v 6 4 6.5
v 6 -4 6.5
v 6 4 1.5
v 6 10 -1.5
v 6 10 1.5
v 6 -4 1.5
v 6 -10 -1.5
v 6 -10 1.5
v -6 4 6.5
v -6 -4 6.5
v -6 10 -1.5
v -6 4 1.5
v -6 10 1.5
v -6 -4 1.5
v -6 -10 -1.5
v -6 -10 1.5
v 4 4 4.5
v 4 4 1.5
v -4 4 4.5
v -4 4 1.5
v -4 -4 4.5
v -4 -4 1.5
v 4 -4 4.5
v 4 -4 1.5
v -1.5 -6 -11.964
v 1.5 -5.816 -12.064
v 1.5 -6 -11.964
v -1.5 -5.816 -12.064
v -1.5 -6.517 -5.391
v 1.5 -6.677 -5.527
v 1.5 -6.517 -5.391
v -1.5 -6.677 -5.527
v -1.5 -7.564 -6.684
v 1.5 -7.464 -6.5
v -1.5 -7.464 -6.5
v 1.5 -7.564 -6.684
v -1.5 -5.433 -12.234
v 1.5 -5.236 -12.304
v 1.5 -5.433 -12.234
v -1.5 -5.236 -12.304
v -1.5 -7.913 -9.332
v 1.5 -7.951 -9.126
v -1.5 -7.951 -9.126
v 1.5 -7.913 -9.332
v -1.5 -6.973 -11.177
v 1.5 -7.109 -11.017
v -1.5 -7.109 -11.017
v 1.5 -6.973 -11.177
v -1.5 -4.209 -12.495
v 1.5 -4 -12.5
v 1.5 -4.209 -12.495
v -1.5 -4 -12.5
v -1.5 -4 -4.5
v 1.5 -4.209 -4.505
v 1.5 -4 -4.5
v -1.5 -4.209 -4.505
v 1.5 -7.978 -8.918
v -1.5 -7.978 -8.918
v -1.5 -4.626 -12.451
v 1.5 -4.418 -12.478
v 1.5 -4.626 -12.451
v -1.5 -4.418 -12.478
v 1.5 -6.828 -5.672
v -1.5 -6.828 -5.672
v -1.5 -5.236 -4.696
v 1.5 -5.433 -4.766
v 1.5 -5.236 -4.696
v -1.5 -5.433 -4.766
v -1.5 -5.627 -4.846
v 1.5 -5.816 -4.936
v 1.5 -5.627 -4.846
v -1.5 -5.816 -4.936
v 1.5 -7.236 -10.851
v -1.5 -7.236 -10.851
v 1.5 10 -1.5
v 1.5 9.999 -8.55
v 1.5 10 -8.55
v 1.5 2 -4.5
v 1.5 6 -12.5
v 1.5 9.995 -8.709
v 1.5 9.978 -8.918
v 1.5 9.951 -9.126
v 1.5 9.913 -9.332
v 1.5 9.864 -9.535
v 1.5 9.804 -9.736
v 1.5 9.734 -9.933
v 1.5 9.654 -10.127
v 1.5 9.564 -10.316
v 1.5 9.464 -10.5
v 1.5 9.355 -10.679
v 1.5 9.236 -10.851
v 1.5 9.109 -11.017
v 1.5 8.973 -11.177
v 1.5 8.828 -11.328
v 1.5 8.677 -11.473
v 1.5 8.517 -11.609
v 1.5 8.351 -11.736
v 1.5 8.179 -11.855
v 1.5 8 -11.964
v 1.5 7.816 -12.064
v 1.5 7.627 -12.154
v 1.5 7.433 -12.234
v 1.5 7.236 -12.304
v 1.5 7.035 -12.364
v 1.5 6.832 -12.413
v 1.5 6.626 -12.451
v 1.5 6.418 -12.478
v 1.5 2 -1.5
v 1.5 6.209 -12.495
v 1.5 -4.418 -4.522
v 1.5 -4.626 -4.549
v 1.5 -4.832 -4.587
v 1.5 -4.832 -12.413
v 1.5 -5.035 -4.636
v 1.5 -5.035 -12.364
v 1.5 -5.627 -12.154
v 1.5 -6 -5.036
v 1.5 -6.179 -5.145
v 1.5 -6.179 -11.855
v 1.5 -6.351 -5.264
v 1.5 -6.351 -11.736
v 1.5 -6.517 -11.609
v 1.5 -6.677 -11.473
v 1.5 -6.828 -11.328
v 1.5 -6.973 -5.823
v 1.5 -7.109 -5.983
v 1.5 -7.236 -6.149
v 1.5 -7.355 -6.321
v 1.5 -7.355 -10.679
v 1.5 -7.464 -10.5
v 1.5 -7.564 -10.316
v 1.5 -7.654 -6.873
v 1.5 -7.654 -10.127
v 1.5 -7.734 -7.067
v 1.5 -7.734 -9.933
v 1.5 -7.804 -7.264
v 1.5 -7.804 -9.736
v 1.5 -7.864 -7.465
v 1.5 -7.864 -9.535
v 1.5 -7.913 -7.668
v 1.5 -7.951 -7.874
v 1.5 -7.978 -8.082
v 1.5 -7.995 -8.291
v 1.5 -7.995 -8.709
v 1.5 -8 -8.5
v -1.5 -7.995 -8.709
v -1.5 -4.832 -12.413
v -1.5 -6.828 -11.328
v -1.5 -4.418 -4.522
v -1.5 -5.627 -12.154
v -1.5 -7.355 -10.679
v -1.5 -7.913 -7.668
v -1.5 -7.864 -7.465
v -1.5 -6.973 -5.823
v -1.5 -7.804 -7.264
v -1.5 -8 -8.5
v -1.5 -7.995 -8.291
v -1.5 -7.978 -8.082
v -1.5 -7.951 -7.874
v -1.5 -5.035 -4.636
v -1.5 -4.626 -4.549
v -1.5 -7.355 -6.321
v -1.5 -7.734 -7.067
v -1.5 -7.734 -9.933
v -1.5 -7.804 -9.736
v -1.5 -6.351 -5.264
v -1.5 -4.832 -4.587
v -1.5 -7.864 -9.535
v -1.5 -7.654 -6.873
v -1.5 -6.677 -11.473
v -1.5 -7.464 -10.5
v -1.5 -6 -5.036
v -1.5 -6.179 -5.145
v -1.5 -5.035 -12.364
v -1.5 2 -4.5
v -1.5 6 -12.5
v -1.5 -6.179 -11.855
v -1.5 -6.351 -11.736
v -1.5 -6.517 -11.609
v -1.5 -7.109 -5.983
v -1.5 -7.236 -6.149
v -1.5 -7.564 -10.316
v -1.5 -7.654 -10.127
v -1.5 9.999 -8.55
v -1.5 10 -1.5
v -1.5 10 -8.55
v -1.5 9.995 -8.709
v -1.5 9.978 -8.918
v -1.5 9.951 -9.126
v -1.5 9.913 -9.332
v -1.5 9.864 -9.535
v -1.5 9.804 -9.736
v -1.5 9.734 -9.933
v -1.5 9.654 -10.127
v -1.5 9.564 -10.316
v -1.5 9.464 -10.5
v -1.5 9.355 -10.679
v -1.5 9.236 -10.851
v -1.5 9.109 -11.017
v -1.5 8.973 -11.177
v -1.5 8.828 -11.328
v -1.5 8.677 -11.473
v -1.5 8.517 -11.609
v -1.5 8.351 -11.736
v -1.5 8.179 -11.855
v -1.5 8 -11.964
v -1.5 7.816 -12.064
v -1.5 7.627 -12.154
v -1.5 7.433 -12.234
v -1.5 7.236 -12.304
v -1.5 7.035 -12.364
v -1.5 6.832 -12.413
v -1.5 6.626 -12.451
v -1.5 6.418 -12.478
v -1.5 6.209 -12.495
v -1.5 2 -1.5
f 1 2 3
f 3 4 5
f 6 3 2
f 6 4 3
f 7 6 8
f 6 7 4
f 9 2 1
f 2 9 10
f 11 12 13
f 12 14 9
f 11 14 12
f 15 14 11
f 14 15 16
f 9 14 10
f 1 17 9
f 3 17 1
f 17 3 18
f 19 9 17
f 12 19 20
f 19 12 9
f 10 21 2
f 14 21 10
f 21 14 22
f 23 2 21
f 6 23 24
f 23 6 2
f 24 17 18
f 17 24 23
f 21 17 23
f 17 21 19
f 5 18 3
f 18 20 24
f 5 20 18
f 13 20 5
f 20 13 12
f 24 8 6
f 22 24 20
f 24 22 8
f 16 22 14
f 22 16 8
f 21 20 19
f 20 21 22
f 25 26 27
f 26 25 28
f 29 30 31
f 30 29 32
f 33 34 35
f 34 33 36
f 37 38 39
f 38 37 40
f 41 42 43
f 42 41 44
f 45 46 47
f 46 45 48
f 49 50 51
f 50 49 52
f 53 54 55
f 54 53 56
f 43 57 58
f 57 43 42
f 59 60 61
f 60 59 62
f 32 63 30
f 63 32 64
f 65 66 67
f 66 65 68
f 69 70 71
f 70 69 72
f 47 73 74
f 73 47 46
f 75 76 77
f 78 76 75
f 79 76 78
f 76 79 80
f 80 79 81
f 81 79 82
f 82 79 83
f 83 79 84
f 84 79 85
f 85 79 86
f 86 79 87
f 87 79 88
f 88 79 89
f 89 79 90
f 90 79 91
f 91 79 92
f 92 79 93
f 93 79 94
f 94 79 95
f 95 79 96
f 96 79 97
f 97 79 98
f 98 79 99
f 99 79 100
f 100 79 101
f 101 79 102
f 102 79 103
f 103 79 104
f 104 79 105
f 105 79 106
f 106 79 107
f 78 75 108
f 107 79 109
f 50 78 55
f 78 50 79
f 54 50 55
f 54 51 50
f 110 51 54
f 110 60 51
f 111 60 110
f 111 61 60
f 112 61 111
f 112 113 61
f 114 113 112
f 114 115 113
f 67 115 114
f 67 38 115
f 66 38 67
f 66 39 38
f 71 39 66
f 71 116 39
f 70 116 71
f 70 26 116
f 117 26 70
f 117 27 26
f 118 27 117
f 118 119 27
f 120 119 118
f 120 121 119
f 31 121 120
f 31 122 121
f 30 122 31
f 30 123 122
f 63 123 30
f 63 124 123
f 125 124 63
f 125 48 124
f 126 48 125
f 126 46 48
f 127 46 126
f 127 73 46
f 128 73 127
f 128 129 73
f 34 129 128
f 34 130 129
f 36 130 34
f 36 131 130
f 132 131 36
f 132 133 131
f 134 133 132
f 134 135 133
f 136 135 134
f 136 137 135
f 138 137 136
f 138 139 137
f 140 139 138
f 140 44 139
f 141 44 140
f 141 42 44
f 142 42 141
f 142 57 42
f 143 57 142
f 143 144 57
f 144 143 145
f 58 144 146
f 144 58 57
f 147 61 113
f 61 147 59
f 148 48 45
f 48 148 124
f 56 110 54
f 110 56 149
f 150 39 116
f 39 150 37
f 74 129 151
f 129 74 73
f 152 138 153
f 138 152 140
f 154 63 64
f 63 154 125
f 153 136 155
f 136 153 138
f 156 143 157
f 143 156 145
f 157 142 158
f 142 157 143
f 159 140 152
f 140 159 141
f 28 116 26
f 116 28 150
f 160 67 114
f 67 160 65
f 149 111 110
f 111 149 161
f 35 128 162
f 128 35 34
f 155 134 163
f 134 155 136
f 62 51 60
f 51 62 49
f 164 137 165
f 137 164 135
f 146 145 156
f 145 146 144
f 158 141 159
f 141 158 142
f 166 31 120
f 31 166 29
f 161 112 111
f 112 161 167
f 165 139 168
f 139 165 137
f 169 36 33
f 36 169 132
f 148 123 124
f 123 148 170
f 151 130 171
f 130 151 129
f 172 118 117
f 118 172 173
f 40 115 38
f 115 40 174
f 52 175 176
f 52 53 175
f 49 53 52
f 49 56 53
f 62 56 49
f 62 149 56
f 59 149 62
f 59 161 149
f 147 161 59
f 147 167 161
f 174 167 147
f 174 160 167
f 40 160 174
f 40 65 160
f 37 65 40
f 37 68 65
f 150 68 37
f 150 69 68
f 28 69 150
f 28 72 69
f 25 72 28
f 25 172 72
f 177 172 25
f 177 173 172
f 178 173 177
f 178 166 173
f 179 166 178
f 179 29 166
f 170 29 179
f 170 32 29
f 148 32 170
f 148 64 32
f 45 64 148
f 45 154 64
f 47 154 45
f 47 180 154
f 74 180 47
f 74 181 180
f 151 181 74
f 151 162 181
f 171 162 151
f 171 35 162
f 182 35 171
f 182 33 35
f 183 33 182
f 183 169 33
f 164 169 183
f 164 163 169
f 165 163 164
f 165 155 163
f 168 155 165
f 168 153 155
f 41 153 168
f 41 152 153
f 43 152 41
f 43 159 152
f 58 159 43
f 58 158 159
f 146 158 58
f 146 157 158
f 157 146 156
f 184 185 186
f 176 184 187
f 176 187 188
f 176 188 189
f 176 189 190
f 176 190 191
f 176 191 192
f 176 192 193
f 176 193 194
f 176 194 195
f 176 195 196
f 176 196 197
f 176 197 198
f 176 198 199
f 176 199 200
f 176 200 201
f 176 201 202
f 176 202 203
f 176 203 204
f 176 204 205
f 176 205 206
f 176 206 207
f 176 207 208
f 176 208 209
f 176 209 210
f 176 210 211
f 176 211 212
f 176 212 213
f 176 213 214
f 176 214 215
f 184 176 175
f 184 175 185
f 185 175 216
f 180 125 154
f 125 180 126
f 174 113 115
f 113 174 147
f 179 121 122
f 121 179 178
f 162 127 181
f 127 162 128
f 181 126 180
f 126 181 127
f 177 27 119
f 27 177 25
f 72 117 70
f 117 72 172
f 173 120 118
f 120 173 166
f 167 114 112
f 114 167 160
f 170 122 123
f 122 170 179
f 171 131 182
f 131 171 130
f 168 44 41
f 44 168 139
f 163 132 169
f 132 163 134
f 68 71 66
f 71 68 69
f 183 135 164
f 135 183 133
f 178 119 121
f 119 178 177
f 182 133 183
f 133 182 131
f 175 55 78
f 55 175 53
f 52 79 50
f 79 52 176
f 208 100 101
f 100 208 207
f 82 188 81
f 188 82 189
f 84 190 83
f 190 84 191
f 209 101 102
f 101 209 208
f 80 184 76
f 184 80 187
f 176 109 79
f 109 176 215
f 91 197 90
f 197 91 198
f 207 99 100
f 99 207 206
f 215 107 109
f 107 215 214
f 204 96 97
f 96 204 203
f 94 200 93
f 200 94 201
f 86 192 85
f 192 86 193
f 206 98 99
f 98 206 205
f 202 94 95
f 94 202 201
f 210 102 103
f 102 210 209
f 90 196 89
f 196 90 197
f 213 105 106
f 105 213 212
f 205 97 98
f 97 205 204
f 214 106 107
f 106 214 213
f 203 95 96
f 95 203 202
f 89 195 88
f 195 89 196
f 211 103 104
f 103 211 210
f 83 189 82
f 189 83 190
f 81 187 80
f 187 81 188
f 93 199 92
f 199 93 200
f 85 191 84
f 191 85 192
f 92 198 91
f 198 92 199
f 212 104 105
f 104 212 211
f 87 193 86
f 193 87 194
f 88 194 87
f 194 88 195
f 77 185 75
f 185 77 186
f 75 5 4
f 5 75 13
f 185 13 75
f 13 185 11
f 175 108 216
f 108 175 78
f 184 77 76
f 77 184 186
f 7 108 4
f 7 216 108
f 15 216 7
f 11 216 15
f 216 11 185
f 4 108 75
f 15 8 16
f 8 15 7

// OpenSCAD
$fn=120;

hook_thickness = 3;
hook_inner_height = 10;
hook_max_depth = 8;

cable_binder_width = 8;
cable_binder_height = 3;
cable_binder_wall = 2;
cable_binder_x = cable_binder_width + 2 * cable_binder_wall;
cable_binder_y = hook_max_depth;
cable_binder_z = cable_binder_height + cable_binder_wall * 2;

_JOIN = 0.1;

module hook() {
    hook_radius = hook_max_depth / 2;
    cylinder(hook_thickness, hook_radius, hook_radius, center=true);
    translate([hook_inner_height / 2, 0, 0]) cube([hook_inner_height, hook_max_depth, hook_thickness], center=true);
    translate([hook_inner_height, 0, 0]) cylinder(hook_thickness, hook_radius, hook_radius, center=true);
    y = hook_max_depth / 2 + hook_thickness;
    translate([hook_inner_height, y / 2, 0]) cube([hook_max_depth, y + _JOIN, hook_thickness], center=true);
}



module cable_binder_tunnel() {

    difference() {
        cube([cable_binder_x, cable_binder_y, cable_binder_z], center=true);
        cube([cable_binder_width, cable_binder_y + 2, cable_binder_height], center=true);
    }
}

module all() {
    cube([cable_binder_x, hook_max_depth * 2.5, hook_thickness], center=true);

    dy_cable = 0;//hook_max_depth * 1.25 - cable_binder_y / 2;
    dz_cable = (cable_binder_z + hook_thickness) / 2 - cable_binder_wall;
    translate([0, -dy_cable, dz_cable]) cable_binder_tunnel();

    dx_hook = hook_inner_height;
    dy_hook = hook_max_depth / 2 + hook_thickness;
    dz_rotated_hook = hook_thickness / 2;
    dy_rotated_hook = hook_max_depth - hook_max_depth / 4 ;
    translate([0, dy_rotated_hook, -dz_rotated_hook]) rotate([90, 0, 90]) translate([-dx_hook, -dy_hook, 0]) hook();
}


all();
